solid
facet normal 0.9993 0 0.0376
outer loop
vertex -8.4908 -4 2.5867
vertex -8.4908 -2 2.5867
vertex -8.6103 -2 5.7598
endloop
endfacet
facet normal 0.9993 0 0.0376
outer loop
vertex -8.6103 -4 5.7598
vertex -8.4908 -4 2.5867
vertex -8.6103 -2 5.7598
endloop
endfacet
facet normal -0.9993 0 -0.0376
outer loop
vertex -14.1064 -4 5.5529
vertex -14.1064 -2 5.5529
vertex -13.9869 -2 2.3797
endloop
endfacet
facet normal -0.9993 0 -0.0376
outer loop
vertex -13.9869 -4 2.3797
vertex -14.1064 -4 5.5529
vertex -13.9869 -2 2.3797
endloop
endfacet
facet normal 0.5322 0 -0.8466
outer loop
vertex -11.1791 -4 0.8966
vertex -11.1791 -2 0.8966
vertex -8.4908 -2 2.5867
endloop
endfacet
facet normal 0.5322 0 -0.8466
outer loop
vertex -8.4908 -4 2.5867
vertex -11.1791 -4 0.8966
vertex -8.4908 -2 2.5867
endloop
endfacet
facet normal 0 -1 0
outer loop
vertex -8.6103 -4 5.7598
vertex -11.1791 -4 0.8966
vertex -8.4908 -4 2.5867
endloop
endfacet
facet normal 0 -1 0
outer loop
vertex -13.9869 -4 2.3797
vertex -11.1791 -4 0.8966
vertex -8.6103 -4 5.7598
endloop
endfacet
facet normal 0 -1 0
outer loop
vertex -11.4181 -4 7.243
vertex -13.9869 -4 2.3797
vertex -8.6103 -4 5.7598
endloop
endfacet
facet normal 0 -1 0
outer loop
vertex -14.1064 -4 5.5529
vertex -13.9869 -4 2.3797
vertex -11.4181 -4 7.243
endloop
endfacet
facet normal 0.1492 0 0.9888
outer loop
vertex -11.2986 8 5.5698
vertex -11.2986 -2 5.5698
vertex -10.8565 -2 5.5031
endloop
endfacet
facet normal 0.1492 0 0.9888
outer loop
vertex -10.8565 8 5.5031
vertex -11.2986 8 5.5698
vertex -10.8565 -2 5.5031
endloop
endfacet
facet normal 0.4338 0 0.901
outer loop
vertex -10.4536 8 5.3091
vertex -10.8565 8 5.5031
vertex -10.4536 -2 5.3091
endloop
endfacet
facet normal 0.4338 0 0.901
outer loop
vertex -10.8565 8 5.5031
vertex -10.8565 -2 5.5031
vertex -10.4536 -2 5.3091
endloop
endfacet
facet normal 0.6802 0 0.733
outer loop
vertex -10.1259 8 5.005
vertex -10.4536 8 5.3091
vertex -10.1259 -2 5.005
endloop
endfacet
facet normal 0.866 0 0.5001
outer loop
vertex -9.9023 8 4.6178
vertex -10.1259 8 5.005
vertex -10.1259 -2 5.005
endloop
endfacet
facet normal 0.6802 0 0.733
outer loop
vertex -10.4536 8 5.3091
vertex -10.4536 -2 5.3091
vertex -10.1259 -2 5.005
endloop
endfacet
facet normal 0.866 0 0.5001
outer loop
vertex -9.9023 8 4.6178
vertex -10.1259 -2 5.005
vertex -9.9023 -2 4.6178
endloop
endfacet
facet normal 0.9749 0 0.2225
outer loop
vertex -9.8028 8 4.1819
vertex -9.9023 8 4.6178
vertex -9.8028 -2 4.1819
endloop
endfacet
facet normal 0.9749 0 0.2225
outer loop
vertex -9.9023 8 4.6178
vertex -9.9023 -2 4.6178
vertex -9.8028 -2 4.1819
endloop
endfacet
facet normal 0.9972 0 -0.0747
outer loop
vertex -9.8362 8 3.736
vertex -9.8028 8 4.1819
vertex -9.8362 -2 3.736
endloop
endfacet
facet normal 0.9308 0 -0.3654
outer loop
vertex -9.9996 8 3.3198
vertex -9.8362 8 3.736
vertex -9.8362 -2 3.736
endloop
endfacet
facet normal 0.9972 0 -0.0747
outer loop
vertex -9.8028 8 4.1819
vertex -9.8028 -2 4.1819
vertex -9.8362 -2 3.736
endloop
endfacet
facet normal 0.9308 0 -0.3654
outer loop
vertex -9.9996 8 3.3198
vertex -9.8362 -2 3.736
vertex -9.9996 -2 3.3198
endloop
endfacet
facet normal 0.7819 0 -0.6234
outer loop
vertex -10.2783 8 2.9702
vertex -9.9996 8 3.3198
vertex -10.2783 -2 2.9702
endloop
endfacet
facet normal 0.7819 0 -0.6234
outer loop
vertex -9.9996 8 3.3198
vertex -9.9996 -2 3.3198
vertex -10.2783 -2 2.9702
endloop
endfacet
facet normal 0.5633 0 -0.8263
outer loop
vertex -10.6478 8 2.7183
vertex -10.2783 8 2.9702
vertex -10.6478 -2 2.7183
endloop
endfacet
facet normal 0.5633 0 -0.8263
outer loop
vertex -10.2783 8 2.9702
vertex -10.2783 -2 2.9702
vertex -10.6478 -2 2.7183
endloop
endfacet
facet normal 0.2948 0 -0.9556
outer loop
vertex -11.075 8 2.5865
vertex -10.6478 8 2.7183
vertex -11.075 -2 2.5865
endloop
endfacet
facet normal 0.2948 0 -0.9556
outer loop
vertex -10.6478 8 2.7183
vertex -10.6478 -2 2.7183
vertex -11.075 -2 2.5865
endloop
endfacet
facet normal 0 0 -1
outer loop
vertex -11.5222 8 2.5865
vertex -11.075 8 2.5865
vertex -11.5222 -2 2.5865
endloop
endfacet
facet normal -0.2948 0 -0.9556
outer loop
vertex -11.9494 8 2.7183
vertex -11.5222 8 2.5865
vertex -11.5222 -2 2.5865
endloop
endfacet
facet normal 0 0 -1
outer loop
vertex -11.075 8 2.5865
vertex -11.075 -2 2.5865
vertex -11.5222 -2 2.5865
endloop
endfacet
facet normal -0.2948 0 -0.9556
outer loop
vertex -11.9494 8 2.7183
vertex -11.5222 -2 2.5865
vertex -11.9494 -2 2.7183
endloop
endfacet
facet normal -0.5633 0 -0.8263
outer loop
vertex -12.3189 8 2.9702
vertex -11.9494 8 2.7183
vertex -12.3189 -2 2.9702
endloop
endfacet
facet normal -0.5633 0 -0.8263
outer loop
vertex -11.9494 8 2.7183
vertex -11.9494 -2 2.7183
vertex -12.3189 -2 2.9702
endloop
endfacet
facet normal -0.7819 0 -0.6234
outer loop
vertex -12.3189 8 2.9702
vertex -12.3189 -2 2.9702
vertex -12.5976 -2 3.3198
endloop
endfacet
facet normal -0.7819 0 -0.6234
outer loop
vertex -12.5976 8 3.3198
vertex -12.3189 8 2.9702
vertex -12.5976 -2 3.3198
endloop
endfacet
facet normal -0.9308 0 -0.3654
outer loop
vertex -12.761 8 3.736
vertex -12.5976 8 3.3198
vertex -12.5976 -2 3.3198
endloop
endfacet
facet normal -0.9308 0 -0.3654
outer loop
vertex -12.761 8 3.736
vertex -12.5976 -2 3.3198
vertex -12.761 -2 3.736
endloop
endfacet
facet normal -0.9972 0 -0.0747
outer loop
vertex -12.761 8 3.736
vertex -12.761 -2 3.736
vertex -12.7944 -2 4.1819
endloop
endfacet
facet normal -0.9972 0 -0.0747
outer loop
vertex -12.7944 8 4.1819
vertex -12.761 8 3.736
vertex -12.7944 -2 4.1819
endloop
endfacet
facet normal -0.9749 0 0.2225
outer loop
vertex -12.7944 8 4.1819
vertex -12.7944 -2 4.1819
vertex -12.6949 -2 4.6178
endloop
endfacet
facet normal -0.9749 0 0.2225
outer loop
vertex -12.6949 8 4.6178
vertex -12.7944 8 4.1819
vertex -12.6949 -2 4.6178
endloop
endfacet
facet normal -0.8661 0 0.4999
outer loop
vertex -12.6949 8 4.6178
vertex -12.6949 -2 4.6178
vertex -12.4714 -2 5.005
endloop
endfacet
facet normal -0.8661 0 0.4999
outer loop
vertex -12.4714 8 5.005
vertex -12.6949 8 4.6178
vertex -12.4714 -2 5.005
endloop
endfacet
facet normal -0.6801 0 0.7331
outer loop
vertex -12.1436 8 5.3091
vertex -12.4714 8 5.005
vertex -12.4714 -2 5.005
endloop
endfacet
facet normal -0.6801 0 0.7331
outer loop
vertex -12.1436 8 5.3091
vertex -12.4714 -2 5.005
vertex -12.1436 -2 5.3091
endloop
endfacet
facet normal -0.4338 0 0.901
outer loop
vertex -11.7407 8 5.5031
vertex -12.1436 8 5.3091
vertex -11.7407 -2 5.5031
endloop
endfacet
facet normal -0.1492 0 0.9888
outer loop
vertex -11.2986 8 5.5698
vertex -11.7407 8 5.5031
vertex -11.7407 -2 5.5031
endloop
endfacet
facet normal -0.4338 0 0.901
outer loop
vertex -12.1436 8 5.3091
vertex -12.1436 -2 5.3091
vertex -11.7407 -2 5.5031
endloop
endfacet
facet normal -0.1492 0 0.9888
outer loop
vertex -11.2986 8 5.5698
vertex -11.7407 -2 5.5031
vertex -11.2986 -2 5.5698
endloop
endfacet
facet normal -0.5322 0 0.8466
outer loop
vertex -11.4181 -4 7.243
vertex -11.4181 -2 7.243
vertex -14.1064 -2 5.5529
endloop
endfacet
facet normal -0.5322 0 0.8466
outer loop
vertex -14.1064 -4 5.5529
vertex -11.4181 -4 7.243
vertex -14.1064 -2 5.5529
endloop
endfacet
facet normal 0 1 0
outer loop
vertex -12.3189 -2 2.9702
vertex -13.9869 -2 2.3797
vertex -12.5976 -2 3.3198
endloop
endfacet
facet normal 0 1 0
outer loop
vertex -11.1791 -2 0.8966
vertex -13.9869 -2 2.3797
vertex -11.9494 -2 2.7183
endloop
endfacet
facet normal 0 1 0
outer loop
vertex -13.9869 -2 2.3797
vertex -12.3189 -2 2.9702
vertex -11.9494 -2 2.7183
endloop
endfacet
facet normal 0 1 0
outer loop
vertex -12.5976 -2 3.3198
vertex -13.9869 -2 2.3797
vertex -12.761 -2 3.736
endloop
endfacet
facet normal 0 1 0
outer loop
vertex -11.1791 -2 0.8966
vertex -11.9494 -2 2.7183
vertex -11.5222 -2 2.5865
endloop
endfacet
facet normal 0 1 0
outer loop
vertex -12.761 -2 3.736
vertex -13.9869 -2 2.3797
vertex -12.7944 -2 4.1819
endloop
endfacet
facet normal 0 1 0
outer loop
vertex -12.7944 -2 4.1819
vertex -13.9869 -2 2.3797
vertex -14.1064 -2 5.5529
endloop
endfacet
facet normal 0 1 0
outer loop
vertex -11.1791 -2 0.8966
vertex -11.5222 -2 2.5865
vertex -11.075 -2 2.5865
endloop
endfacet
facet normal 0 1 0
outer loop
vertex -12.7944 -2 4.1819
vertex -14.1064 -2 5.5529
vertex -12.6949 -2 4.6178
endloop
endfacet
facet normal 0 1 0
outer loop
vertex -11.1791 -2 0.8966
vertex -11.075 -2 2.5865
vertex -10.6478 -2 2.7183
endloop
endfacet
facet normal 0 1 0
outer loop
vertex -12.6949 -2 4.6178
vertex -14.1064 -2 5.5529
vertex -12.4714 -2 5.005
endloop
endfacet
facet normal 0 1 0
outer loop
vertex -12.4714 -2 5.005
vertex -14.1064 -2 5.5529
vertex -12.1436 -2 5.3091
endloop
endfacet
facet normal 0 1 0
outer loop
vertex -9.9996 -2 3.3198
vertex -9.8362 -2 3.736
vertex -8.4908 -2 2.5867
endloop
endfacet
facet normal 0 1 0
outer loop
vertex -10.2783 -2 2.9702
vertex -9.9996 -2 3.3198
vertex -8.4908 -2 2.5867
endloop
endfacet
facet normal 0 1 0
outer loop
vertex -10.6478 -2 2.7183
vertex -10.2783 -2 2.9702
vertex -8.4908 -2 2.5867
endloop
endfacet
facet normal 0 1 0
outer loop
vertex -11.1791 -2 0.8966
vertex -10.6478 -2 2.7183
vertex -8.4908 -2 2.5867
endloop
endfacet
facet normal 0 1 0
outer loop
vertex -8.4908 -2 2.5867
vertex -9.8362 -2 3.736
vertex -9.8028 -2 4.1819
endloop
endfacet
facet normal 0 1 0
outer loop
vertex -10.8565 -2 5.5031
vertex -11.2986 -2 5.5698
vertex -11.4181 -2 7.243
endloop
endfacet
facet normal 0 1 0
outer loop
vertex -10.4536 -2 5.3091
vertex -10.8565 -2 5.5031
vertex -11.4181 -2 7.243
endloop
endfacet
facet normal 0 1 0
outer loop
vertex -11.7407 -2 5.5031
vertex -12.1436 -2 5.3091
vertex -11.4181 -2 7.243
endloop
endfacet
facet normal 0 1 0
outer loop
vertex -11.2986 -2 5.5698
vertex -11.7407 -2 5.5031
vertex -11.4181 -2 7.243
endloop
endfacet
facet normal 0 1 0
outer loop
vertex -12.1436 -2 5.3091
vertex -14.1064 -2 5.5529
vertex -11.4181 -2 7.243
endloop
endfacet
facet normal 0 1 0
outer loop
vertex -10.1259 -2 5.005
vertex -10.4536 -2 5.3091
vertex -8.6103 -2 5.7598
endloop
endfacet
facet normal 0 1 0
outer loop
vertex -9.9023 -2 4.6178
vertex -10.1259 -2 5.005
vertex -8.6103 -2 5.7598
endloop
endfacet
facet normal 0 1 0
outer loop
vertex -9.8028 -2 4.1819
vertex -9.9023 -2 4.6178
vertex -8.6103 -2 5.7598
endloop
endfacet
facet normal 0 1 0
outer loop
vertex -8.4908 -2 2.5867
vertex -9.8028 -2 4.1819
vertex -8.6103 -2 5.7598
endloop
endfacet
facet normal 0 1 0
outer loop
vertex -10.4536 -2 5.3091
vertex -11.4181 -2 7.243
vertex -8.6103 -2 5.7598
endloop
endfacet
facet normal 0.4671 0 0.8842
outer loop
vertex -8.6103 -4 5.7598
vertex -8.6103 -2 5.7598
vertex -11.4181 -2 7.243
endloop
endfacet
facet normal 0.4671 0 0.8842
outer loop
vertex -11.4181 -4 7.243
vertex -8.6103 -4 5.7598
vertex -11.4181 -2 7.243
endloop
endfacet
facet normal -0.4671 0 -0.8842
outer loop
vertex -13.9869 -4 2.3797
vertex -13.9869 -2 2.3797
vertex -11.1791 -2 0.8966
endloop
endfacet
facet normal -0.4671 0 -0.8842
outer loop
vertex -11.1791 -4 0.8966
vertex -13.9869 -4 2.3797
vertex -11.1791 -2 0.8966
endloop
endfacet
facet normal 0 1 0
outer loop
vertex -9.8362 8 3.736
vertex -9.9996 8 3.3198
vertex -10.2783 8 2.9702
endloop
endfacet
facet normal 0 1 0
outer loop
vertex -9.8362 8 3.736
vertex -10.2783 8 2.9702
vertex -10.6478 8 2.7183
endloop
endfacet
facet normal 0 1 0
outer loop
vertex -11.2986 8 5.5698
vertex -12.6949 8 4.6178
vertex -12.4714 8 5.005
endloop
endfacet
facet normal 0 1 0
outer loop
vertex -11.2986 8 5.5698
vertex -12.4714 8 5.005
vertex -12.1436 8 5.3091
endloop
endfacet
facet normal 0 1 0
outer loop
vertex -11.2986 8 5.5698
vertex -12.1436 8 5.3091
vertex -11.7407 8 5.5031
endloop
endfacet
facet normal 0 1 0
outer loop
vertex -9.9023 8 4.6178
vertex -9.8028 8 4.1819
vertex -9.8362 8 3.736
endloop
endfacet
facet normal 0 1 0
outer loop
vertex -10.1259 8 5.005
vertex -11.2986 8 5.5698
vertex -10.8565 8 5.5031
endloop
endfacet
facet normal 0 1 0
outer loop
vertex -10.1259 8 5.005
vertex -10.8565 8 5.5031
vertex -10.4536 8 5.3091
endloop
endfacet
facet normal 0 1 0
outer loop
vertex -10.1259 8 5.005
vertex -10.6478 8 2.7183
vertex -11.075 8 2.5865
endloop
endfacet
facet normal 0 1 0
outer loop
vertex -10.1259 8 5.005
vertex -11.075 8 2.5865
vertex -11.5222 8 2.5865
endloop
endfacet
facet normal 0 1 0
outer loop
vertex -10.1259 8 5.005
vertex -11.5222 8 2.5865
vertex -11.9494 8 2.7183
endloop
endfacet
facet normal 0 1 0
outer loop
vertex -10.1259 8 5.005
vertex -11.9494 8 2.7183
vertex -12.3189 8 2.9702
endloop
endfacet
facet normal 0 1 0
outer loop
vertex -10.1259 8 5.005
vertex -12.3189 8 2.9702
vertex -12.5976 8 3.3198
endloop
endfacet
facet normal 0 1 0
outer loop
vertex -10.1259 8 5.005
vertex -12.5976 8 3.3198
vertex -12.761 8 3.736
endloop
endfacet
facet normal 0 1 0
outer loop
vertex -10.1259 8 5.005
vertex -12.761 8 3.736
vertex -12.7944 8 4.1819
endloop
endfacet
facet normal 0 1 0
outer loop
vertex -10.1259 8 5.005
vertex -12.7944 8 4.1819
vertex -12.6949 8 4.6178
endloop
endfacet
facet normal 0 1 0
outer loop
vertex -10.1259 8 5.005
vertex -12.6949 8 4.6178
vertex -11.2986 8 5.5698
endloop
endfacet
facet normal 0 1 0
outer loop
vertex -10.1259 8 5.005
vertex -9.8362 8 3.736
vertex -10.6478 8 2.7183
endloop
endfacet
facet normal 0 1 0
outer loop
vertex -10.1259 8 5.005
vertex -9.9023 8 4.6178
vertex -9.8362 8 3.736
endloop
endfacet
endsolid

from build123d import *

# Parameters (mm, degrees)
BOSS_EXTRUDE1_DEPTH      = 8
BOSS_EXTRUDE1_DEPTH_BACK = 2
SKETCH1_R                = 1.5
SKETCH2_R                = 1.5
BOSS_EXTRUDE2_DEPTH      = 2
SKETCH5_R                = 1.5
BOSS_EXTRUDE3_DEPTH      = 2


with BuildPart() as part:
    # Sketch1 → Boss-Extrude1 (new, two sides: drawn at the far end of the back side and taken through both)
    with BuildSketch(Plane(origin=(0, 0, 0), x_dir=(1, 0, 0), z_dir=(0, 1, 0)).offset(-BOSS_EXTRUDE1_DEPTH_BACK)):
        with Locations(Location((-11.29860715, -4.069786589, 0), (0, 0, 270))):
            Circle(SKETCH1_R)
    extrude(amount=BOSS_EXTRUDE1_DEPTH + BOSS_EXTRUDE1_DEPTH_BACK)



with BuildPart() as body_2:
    # Sketch2 → Boss-Extrude2 (new body)
    with BuildSketch(Plane.XZ.offset(2)):
        Polygon((-14.106389898, 5.552921571), (-13.986931095, 2.379742892), (-11.179148348, 0.89660791), (-8.490824402, 2.586651607), (-8.610283205, 5.759830286), (-11.418065953, 7.242965268), align=None)
        with Locations(Location((-11.29860715, 4.069786589, 0), (0, 0, 90))):
            Circle(SKETCH2_R, mode=Mode.SUBTRACT)
    extrude(amount=BOSS_EXTRUDE2_DEPTH)


with BuildPart() as part_1:
    add(part.part)

    add(body_2.part)  # Boss-Extrude3 merges body 2
    # Sketch5 → Boss-Extrude3 (add)
    with BuildSketch(Plane.XZ.offset(4)):
        with Locations(Location((-11.29860715, 4.069786589, 0), (0, 0, 90))):
            Circle(SKETCH5_R)
    extrude(amount=-BOSS_EXTRUDE3_DEPTH)


solid = part_1.part
